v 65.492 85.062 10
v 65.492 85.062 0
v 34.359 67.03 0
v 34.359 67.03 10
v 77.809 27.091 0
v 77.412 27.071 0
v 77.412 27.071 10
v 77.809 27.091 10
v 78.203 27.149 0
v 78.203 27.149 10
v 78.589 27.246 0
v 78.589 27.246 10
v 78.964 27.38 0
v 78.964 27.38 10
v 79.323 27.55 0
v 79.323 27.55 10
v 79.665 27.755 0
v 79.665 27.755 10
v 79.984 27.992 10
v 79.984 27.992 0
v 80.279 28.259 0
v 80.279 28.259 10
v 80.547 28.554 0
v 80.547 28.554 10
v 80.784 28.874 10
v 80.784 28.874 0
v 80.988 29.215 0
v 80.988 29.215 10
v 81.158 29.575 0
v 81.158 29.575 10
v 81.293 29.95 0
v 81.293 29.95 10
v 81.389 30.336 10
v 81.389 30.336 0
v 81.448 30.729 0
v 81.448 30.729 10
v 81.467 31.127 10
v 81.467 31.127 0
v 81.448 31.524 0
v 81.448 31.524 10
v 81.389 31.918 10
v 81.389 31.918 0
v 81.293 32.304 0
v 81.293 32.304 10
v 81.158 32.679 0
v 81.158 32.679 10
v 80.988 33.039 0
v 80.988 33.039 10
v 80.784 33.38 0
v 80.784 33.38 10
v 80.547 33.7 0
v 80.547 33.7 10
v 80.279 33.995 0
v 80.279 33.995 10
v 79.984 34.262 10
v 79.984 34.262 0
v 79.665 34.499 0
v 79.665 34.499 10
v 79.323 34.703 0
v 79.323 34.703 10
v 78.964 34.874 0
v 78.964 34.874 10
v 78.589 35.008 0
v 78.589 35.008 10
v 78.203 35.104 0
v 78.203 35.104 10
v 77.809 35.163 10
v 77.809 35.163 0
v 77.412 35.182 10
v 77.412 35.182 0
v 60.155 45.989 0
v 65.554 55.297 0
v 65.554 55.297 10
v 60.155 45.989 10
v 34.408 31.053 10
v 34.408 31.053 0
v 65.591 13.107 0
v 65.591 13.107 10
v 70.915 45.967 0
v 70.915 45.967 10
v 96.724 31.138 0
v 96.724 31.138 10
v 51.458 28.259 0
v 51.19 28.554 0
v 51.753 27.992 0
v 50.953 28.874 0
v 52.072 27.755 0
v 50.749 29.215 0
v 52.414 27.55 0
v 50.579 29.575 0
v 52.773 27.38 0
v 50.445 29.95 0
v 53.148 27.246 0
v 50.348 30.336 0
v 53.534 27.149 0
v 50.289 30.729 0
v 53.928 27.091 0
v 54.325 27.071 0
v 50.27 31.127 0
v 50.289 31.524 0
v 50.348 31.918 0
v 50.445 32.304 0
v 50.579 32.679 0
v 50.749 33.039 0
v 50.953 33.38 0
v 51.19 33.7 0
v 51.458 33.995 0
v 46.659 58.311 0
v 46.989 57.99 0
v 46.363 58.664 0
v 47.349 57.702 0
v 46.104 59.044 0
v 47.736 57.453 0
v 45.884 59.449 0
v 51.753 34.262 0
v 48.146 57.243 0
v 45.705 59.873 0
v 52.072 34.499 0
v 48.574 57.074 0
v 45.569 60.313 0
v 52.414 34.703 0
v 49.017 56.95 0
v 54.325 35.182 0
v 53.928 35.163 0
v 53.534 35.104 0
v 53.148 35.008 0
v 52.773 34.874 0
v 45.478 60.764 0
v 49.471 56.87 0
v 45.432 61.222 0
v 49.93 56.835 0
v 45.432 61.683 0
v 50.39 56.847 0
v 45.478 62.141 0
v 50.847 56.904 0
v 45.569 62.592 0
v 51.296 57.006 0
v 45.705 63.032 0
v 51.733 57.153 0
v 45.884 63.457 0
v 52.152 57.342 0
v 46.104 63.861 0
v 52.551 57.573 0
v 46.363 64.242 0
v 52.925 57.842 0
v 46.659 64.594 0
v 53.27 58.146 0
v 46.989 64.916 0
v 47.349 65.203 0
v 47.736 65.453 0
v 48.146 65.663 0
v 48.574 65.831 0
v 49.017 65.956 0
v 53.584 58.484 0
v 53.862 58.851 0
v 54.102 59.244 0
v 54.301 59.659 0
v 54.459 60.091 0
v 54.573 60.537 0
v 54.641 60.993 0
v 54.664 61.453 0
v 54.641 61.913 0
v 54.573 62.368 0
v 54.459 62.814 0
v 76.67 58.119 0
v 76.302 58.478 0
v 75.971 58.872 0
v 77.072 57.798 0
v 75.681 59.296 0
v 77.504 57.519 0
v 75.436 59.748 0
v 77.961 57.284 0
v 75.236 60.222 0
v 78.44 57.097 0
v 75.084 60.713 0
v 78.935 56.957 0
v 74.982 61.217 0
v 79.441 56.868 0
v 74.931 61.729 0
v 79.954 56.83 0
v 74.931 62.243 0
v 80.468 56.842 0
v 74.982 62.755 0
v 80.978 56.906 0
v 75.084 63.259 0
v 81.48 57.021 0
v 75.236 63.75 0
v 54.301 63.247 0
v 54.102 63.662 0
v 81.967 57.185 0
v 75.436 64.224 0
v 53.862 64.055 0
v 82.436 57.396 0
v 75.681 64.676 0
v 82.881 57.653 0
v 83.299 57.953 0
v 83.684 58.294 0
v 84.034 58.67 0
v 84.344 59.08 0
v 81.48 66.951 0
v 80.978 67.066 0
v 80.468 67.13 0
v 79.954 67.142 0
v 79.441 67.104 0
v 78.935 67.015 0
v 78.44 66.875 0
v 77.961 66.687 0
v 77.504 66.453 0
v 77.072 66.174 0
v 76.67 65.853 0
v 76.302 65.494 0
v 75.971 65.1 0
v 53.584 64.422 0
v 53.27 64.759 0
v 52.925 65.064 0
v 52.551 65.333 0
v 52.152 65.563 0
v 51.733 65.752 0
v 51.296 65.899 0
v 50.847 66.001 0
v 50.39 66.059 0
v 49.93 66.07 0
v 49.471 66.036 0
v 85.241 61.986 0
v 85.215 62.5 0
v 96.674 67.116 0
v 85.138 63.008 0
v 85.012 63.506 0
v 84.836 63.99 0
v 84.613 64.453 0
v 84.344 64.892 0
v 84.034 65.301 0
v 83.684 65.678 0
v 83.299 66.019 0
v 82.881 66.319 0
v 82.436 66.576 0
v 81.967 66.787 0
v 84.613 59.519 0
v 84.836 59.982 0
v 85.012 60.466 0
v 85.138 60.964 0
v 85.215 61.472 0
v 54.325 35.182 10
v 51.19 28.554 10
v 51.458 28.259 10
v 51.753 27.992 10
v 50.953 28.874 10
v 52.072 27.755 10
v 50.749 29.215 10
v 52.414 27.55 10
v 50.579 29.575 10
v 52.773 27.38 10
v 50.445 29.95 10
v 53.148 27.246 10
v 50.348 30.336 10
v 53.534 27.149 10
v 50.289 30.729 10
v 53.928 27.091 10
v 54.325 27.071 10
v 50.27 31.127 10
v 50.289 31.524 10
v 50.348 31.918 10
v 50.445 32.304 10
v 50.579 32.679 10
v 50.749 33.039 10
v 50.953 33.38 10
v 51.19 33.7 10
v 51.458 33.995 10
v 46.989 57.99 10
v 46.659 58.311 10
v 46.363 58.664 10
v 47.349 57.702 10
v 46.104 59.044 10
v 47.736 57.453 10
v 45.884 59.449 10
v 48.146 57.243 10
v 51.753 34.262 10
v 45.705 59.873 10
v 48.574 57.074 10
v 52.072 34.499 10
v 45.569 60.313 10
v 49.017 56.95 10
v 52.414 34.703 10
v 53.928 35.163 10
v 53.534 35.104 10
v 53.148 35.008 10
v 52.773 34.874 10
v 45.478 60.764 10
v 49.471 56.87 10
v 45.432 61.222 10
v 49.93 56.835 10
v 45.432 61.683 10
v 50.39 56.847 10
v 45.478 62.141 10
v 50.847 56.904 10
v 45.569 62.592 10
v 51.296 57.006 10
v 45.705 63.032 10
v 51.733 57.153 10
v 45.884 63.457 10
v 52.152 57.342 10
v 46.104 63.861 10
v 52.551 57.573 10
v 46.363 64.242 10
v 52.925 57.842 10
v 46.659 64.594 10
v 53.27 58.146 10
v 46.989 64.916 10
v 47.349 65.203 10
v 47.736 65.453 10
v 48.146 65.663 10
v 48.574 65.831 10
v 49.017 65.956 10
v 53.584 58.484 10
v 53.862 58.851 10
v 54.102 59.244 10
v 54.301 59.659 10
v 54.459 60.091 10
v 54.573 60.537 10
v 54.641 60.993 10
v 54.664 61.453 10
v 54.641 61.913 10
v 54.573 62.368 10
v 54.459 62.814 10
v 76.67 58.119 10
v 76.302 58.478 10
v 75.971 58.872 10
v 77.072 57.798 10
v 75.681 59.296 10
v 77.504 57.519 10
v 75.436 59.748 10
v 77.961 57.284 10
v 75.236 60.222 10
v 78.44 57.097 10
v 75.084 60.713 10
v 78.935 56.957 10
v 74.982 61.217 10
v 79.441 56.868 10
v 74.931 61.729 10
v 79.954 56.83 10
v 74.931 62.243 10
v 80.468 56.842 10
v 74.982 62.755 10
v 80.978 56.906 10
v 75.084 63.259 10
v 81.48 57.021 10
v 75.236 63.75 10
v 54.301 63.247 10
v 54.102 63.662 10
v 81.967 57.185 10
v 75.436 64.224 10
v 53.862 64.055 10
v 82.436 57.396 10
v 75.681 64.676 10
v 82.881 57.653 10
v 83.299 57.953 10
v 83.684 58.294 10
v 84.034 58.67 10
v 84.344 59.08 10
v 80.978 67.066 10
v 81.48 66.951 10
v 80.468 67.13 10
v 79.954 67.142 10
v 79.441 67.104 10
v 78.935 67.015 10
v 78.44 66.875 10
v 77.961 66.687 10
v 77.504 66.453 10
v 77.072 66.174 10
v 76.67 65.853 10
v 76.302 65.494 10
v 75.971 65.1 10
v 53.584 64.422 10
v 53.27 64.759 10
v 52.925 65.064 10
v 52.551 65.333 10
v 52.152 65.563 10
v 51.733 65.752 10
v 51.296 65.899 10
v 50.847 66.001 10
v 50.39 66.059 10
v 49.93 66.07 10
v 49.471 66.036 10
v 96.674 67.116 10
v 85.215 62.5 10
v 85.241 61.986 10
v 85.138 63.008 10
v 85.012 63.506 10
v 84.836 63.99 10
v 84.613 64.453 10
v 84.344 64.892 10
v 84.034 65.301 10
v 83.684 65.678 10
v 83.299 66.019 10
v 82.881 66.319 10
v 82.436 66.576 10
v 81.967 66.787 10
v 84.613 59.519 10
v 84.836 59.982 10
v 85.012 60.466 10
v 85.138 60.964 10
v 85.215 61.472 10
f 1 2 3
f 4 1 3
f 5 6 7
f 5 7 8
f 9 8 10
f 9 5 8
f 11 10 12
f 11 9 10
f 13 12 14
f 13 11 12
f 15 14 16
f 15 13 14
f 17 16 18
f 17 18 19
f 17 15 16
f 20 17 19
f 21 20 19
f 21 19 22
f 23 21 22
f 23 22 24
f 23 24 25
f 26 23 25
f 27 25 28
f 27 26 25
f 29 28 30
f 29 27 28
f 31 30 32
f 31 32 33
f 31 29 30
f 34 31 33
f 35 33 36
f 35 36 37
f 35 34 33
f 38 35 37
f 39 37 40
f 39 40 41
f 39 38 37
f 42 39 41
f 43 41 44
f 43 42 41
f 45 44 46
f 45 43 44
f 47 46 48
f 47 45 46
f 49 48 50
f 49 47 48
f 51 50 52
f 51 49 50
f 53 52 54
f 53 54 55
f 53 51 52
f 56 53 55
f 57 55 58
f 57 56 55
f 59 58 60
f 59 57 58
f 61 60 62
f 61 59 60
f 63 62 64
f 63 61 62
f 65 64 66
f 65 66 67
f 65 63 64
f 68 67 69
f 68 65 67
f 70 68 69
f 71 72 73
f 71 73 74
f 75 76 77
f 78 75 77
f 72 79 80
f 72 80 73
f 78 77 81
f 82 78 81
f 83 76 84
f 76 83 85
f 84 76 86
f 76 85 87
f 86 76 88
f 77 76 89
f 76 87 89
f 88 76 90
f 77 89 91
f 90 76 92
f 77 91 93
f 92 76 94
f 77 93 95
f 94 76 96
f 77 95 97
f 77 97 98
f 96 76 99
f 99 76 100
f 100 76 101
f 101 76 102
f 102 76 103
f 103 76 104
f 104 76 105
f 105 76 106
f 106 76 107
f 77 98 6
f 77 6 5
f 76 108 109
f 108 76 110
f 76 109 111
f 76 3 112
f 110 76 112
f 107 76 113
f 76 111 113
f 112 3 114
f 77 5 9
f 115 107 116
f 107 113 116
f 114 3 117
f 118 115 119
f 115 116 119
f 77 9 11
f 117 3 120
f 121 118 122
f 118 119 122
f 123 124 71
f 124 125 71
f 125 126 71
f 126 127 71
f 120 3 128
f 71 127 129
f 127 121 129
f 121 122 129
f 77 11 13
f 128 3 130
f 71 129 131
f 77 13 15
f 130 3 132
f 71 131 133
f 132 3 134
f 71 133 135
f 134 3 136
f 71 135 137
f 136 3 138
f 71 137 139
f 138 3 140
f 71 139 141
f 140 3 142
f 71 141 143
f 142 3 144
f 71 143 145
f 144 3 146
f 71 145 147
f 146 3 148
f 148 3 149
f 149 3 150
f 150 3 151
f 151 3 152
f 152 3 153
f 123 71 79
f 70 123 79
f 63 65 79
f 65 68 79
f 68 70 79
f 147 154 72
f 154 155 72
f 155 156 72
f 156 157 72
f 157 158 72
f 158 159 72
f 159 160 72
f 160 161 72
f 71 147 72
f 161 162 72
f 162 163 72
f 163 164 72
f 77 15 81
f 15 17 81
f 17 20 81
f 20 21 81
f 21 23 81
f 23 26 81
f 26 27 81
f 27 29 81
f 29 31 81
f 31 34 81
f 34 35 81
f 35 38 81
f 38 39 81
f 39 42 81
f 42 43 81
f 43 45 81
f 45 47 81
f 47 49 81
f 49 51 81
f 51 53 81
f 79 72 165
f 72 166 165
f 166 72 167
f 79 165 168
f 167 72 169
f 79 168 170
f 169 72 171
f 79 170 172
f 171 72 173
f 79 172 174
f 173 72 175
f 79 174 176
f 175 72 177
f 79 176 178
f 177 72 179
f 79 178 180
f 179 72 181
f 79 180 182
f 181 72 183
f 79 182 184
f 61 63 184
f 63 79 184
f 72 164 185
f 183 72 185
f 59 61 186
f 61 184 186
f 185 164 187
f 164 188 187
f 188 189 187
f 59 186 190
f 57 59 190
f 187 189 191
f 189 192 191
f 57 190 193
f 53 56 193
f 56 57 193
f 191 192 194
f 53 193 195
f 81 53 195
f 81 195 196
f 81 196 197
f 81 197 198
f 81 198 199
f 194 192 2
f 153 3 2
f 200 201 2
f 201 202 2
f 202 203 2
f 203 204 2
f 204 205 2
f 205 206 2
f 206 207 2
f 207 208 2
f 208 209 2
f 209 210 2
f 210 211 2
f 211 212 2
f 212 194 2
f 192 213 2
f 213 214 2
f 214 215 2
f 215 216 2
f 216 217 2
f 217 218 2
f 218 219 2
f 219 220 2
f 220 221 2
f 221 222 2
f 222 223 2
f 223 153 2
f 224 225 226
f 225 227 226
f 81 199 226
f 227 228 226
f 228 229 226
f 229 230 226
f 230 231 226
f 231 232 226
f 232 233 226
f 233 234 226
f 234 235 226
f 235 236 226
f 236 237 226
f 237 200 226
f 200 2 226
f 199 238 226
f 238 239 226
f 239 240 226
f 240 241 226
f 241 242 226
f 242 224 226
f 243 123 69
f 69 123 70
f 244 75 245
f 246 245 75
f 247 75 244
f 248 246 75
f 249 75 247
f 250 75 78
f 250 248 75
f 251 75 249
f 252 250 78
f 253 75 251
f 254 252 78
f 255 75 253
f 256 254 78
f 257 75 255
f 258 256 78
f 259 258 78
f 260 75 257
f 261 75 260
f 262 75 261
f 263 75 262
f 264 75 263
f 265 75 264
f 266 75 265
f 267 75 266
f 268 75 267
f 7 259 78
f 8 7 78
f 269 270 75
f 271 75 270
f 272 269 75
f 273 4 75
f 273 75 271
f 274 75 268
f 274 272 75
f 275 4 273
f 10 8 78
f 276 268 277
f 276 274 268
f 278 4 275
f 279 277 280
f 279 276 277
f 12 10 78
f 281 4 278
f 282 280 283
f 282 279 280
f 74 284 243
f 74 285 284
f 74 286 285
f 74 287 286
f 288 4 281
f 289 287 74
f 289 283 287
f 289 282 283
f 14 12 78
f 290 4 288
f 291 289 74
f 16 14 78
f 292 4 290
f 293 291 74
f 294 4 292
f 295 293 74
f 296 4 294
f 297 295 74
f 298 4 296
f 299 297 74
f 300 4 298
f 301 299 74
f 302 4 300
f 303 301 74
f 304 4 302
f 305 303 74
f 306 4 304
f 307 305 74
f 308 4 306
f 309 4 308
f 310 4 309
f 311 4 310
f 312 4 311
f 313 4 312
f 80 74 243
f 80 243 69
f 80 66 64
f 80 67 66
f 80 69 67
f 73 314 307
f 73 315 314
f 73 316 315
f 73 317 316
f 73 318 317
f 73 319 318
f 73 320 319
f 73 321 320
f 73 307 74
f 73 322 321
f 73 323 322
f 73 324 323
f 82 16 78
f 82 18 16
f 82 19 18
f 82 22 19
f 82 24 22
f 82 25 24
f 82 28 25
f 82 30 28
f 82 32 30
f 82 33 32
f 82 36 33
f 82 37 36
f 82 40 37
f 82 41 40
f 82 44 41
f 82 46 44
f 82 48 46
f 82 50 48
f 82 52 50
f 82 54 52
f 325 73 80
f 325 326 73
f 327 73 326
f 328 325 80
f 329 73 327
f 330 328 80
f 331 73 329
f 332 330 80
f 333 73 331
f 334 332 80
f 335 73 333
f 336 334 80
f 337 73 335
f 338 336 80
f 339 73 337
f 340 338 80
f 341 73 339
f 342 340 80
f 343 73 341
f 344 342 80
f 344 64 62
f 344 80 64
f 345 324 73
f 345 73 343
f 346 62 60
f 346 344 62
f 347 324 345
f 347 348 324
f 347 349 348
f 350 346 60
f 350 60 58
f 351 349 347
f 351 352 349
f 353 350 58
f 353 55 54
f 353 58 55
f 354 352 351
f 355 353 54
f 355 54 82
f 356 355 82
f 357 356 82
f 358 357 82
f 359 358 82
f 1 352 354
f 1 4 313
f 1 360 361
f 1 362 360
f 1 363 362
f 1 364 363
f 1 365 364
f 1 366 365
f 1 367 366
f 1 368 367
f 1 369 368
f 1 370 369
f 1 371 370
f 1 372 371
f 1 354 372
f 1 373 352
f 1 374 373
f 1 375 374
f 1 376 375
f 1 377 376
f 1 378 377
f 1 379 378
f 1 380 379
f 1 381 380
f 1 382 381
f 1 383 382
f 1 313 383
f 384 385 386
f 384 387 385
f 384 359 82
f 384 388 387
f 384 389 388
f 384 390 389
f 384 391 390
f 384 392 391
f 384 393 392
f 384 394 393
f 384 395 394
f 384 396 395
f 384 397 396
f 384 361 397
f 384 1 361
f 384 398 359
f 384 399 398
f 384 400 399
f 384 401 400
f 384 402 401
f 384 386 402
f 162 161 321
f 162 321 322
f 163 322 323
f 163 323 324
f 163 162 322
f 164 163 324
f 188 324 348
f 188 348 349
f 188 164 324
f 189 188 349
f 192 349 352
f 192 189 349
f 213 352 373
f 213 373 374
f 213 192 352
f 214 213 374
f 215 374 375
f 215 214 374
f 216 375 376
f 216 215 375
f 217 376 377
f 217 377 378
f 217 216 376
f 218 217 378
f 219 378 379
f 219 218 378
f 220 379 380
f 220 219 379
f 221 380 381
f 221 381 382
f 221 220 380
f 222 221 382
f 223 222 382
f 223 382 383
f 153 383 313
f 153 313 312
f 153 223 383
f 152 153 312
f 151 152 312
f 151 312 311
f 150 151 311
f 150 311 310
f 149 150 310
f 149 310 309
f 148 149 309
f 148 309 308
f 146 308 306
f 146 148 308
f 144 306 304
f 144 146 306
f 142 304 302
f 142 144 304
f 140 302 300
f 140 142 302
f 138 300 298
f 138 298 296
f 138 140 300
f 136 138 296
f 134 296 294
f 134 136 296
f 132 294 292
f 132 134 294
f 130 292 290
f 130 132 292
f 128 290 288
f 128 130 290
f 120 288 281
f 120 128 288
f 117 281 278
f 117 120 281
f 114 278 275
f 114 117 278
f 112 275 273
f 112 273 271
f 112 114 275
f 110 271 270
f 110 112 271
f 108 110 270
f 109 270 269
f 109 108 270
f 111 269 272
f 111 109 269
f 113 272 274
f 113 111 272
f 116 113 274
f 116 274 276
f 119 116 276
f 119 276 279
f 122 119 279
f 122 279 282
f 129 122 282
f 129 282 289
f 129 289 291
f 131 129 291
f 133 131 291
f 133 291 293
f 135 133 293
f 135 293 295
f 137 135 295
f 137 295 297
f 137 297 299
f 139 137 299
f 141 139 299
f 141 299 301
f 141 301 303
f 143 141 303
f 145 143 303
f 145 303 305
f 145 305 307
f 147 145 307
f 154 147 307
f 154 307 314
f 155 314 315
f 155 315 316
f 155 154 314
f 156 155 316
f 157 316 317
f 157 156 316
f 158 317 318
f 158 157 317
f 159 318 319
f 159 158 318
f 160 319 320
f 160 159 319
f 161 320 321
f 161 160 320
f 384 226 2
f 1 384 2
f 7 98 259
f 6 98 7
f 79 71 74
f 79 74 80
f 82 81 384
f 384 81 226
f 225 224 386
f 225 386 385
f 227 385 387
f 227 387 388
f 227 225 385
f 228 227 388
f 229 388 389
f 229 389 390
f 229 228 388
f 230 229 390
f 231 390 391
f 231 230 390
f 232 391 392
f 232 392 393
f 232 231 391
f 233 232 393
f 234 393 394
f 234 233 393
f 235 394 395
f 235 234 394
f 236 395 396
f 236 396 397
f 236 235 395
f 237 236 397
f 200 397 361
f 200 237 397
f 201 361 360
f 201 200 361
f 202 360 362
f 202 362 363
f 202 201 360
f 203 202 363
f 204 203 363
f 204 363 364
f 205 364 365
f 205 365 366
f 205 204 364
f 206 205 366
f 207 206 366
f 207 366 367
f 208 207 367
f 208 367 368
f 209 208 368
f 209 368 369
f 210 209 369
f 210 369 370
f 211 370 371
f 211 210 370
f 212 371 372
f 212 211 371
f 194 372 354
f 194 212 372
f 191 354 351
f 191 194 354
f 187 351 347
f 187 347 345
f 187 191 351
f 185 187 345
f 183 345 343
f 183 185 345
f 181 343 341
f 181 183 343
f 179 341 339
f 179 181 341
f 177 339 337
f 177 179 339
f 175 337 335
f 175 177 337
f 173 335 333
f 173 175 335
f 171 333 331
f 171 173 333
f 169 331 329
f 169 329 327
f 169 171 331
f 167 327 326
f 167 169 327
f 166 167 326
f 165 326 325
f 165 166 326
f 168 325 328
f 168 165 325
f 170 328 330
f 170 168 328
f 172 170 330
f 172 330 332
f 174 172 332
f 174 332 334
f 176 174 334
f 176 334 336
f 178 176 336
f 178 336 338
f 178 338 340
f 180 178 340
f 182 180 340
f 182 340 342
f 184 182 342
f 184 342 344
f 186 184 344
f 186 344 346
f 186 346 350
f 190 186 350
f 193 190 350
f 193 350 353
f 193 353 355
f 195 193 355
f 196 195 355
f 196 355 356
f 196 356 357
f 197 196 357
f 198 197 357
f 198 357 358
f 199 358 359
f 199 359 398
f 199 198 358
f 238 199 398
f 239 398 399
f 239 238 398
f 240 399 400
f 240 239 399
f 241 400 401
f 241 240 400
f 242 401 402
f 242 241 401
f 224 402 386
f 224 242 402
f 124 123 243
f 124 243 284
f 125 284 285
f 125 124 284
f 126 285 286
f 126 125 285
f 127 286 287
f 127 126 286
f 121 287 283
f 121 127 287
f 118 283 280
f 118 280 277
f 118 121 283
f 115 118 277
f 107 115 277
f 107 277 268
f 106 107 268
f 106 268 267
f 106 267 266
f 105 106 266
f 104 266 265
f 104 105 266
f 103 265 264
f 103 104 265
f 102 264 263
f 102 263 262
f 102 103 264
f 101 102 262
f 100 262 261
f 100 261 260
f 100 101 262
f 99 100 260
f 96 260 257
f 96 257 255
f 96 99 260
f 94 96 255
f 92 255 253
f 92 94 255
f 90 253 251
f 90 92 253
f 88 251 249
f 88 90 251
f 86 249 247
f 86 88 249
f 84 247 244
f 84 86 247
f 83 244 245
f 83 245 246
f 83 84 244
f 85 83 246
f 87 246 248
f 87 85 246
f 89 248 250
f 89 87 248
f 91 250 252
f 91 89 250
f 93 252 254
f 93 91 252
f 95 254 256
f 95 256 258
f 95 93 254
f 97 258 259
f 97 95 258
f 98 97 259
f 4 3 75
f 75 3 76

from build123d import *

# Parameters (mm, degrees)
SKETCH_R   = 4.618848
SKETCH_R_2 = 5.157962
PAD_DEPTH  = 10


with BuildPart() as part:
    # Sketch → Pad (new body)
    with BuildSketch(Plane.XY):
        Polygon((96.723577, 31.138338), (96.674117, 67.116094), (65.491737, 85.062138), (34.358817, 67.030427), (34.408277, 31.052671), (65.590657, 13.106627), align=None)
        with Locations((50.045269, 61.452663)):
            Circle(SKETCH_R, mode=Mode.SUBTRACT)
        with Locations((80.082733, 61.98597)):
            Circle(SKETCH_R_2, mode=Mode.SUBTRACT)
        with BuildLine():
            ThreePointArc((54.325382, 35.182339), (50.269895, 31.126852), (54.325382, 27.071365))
            Line((54.325382, 27.071365), (77.411652, 27.071365))
            ThreePointArc((77.411652, 27.071365), (81.467139, 31.126852), (77.411652, 35.182339))
            Line((54.325382, 35.182339), (77.411652, 35.182339))
        make_face(mode=Mode.SUBTRACT)
        Polygon((65.553779, 55.296537), (60.155022, 45.989201), (70.91479, 45.967409), align=None, mode=Mode.SUBTRACT)
    extrude(amount=PAD_DEPTH)


solid = part.part
